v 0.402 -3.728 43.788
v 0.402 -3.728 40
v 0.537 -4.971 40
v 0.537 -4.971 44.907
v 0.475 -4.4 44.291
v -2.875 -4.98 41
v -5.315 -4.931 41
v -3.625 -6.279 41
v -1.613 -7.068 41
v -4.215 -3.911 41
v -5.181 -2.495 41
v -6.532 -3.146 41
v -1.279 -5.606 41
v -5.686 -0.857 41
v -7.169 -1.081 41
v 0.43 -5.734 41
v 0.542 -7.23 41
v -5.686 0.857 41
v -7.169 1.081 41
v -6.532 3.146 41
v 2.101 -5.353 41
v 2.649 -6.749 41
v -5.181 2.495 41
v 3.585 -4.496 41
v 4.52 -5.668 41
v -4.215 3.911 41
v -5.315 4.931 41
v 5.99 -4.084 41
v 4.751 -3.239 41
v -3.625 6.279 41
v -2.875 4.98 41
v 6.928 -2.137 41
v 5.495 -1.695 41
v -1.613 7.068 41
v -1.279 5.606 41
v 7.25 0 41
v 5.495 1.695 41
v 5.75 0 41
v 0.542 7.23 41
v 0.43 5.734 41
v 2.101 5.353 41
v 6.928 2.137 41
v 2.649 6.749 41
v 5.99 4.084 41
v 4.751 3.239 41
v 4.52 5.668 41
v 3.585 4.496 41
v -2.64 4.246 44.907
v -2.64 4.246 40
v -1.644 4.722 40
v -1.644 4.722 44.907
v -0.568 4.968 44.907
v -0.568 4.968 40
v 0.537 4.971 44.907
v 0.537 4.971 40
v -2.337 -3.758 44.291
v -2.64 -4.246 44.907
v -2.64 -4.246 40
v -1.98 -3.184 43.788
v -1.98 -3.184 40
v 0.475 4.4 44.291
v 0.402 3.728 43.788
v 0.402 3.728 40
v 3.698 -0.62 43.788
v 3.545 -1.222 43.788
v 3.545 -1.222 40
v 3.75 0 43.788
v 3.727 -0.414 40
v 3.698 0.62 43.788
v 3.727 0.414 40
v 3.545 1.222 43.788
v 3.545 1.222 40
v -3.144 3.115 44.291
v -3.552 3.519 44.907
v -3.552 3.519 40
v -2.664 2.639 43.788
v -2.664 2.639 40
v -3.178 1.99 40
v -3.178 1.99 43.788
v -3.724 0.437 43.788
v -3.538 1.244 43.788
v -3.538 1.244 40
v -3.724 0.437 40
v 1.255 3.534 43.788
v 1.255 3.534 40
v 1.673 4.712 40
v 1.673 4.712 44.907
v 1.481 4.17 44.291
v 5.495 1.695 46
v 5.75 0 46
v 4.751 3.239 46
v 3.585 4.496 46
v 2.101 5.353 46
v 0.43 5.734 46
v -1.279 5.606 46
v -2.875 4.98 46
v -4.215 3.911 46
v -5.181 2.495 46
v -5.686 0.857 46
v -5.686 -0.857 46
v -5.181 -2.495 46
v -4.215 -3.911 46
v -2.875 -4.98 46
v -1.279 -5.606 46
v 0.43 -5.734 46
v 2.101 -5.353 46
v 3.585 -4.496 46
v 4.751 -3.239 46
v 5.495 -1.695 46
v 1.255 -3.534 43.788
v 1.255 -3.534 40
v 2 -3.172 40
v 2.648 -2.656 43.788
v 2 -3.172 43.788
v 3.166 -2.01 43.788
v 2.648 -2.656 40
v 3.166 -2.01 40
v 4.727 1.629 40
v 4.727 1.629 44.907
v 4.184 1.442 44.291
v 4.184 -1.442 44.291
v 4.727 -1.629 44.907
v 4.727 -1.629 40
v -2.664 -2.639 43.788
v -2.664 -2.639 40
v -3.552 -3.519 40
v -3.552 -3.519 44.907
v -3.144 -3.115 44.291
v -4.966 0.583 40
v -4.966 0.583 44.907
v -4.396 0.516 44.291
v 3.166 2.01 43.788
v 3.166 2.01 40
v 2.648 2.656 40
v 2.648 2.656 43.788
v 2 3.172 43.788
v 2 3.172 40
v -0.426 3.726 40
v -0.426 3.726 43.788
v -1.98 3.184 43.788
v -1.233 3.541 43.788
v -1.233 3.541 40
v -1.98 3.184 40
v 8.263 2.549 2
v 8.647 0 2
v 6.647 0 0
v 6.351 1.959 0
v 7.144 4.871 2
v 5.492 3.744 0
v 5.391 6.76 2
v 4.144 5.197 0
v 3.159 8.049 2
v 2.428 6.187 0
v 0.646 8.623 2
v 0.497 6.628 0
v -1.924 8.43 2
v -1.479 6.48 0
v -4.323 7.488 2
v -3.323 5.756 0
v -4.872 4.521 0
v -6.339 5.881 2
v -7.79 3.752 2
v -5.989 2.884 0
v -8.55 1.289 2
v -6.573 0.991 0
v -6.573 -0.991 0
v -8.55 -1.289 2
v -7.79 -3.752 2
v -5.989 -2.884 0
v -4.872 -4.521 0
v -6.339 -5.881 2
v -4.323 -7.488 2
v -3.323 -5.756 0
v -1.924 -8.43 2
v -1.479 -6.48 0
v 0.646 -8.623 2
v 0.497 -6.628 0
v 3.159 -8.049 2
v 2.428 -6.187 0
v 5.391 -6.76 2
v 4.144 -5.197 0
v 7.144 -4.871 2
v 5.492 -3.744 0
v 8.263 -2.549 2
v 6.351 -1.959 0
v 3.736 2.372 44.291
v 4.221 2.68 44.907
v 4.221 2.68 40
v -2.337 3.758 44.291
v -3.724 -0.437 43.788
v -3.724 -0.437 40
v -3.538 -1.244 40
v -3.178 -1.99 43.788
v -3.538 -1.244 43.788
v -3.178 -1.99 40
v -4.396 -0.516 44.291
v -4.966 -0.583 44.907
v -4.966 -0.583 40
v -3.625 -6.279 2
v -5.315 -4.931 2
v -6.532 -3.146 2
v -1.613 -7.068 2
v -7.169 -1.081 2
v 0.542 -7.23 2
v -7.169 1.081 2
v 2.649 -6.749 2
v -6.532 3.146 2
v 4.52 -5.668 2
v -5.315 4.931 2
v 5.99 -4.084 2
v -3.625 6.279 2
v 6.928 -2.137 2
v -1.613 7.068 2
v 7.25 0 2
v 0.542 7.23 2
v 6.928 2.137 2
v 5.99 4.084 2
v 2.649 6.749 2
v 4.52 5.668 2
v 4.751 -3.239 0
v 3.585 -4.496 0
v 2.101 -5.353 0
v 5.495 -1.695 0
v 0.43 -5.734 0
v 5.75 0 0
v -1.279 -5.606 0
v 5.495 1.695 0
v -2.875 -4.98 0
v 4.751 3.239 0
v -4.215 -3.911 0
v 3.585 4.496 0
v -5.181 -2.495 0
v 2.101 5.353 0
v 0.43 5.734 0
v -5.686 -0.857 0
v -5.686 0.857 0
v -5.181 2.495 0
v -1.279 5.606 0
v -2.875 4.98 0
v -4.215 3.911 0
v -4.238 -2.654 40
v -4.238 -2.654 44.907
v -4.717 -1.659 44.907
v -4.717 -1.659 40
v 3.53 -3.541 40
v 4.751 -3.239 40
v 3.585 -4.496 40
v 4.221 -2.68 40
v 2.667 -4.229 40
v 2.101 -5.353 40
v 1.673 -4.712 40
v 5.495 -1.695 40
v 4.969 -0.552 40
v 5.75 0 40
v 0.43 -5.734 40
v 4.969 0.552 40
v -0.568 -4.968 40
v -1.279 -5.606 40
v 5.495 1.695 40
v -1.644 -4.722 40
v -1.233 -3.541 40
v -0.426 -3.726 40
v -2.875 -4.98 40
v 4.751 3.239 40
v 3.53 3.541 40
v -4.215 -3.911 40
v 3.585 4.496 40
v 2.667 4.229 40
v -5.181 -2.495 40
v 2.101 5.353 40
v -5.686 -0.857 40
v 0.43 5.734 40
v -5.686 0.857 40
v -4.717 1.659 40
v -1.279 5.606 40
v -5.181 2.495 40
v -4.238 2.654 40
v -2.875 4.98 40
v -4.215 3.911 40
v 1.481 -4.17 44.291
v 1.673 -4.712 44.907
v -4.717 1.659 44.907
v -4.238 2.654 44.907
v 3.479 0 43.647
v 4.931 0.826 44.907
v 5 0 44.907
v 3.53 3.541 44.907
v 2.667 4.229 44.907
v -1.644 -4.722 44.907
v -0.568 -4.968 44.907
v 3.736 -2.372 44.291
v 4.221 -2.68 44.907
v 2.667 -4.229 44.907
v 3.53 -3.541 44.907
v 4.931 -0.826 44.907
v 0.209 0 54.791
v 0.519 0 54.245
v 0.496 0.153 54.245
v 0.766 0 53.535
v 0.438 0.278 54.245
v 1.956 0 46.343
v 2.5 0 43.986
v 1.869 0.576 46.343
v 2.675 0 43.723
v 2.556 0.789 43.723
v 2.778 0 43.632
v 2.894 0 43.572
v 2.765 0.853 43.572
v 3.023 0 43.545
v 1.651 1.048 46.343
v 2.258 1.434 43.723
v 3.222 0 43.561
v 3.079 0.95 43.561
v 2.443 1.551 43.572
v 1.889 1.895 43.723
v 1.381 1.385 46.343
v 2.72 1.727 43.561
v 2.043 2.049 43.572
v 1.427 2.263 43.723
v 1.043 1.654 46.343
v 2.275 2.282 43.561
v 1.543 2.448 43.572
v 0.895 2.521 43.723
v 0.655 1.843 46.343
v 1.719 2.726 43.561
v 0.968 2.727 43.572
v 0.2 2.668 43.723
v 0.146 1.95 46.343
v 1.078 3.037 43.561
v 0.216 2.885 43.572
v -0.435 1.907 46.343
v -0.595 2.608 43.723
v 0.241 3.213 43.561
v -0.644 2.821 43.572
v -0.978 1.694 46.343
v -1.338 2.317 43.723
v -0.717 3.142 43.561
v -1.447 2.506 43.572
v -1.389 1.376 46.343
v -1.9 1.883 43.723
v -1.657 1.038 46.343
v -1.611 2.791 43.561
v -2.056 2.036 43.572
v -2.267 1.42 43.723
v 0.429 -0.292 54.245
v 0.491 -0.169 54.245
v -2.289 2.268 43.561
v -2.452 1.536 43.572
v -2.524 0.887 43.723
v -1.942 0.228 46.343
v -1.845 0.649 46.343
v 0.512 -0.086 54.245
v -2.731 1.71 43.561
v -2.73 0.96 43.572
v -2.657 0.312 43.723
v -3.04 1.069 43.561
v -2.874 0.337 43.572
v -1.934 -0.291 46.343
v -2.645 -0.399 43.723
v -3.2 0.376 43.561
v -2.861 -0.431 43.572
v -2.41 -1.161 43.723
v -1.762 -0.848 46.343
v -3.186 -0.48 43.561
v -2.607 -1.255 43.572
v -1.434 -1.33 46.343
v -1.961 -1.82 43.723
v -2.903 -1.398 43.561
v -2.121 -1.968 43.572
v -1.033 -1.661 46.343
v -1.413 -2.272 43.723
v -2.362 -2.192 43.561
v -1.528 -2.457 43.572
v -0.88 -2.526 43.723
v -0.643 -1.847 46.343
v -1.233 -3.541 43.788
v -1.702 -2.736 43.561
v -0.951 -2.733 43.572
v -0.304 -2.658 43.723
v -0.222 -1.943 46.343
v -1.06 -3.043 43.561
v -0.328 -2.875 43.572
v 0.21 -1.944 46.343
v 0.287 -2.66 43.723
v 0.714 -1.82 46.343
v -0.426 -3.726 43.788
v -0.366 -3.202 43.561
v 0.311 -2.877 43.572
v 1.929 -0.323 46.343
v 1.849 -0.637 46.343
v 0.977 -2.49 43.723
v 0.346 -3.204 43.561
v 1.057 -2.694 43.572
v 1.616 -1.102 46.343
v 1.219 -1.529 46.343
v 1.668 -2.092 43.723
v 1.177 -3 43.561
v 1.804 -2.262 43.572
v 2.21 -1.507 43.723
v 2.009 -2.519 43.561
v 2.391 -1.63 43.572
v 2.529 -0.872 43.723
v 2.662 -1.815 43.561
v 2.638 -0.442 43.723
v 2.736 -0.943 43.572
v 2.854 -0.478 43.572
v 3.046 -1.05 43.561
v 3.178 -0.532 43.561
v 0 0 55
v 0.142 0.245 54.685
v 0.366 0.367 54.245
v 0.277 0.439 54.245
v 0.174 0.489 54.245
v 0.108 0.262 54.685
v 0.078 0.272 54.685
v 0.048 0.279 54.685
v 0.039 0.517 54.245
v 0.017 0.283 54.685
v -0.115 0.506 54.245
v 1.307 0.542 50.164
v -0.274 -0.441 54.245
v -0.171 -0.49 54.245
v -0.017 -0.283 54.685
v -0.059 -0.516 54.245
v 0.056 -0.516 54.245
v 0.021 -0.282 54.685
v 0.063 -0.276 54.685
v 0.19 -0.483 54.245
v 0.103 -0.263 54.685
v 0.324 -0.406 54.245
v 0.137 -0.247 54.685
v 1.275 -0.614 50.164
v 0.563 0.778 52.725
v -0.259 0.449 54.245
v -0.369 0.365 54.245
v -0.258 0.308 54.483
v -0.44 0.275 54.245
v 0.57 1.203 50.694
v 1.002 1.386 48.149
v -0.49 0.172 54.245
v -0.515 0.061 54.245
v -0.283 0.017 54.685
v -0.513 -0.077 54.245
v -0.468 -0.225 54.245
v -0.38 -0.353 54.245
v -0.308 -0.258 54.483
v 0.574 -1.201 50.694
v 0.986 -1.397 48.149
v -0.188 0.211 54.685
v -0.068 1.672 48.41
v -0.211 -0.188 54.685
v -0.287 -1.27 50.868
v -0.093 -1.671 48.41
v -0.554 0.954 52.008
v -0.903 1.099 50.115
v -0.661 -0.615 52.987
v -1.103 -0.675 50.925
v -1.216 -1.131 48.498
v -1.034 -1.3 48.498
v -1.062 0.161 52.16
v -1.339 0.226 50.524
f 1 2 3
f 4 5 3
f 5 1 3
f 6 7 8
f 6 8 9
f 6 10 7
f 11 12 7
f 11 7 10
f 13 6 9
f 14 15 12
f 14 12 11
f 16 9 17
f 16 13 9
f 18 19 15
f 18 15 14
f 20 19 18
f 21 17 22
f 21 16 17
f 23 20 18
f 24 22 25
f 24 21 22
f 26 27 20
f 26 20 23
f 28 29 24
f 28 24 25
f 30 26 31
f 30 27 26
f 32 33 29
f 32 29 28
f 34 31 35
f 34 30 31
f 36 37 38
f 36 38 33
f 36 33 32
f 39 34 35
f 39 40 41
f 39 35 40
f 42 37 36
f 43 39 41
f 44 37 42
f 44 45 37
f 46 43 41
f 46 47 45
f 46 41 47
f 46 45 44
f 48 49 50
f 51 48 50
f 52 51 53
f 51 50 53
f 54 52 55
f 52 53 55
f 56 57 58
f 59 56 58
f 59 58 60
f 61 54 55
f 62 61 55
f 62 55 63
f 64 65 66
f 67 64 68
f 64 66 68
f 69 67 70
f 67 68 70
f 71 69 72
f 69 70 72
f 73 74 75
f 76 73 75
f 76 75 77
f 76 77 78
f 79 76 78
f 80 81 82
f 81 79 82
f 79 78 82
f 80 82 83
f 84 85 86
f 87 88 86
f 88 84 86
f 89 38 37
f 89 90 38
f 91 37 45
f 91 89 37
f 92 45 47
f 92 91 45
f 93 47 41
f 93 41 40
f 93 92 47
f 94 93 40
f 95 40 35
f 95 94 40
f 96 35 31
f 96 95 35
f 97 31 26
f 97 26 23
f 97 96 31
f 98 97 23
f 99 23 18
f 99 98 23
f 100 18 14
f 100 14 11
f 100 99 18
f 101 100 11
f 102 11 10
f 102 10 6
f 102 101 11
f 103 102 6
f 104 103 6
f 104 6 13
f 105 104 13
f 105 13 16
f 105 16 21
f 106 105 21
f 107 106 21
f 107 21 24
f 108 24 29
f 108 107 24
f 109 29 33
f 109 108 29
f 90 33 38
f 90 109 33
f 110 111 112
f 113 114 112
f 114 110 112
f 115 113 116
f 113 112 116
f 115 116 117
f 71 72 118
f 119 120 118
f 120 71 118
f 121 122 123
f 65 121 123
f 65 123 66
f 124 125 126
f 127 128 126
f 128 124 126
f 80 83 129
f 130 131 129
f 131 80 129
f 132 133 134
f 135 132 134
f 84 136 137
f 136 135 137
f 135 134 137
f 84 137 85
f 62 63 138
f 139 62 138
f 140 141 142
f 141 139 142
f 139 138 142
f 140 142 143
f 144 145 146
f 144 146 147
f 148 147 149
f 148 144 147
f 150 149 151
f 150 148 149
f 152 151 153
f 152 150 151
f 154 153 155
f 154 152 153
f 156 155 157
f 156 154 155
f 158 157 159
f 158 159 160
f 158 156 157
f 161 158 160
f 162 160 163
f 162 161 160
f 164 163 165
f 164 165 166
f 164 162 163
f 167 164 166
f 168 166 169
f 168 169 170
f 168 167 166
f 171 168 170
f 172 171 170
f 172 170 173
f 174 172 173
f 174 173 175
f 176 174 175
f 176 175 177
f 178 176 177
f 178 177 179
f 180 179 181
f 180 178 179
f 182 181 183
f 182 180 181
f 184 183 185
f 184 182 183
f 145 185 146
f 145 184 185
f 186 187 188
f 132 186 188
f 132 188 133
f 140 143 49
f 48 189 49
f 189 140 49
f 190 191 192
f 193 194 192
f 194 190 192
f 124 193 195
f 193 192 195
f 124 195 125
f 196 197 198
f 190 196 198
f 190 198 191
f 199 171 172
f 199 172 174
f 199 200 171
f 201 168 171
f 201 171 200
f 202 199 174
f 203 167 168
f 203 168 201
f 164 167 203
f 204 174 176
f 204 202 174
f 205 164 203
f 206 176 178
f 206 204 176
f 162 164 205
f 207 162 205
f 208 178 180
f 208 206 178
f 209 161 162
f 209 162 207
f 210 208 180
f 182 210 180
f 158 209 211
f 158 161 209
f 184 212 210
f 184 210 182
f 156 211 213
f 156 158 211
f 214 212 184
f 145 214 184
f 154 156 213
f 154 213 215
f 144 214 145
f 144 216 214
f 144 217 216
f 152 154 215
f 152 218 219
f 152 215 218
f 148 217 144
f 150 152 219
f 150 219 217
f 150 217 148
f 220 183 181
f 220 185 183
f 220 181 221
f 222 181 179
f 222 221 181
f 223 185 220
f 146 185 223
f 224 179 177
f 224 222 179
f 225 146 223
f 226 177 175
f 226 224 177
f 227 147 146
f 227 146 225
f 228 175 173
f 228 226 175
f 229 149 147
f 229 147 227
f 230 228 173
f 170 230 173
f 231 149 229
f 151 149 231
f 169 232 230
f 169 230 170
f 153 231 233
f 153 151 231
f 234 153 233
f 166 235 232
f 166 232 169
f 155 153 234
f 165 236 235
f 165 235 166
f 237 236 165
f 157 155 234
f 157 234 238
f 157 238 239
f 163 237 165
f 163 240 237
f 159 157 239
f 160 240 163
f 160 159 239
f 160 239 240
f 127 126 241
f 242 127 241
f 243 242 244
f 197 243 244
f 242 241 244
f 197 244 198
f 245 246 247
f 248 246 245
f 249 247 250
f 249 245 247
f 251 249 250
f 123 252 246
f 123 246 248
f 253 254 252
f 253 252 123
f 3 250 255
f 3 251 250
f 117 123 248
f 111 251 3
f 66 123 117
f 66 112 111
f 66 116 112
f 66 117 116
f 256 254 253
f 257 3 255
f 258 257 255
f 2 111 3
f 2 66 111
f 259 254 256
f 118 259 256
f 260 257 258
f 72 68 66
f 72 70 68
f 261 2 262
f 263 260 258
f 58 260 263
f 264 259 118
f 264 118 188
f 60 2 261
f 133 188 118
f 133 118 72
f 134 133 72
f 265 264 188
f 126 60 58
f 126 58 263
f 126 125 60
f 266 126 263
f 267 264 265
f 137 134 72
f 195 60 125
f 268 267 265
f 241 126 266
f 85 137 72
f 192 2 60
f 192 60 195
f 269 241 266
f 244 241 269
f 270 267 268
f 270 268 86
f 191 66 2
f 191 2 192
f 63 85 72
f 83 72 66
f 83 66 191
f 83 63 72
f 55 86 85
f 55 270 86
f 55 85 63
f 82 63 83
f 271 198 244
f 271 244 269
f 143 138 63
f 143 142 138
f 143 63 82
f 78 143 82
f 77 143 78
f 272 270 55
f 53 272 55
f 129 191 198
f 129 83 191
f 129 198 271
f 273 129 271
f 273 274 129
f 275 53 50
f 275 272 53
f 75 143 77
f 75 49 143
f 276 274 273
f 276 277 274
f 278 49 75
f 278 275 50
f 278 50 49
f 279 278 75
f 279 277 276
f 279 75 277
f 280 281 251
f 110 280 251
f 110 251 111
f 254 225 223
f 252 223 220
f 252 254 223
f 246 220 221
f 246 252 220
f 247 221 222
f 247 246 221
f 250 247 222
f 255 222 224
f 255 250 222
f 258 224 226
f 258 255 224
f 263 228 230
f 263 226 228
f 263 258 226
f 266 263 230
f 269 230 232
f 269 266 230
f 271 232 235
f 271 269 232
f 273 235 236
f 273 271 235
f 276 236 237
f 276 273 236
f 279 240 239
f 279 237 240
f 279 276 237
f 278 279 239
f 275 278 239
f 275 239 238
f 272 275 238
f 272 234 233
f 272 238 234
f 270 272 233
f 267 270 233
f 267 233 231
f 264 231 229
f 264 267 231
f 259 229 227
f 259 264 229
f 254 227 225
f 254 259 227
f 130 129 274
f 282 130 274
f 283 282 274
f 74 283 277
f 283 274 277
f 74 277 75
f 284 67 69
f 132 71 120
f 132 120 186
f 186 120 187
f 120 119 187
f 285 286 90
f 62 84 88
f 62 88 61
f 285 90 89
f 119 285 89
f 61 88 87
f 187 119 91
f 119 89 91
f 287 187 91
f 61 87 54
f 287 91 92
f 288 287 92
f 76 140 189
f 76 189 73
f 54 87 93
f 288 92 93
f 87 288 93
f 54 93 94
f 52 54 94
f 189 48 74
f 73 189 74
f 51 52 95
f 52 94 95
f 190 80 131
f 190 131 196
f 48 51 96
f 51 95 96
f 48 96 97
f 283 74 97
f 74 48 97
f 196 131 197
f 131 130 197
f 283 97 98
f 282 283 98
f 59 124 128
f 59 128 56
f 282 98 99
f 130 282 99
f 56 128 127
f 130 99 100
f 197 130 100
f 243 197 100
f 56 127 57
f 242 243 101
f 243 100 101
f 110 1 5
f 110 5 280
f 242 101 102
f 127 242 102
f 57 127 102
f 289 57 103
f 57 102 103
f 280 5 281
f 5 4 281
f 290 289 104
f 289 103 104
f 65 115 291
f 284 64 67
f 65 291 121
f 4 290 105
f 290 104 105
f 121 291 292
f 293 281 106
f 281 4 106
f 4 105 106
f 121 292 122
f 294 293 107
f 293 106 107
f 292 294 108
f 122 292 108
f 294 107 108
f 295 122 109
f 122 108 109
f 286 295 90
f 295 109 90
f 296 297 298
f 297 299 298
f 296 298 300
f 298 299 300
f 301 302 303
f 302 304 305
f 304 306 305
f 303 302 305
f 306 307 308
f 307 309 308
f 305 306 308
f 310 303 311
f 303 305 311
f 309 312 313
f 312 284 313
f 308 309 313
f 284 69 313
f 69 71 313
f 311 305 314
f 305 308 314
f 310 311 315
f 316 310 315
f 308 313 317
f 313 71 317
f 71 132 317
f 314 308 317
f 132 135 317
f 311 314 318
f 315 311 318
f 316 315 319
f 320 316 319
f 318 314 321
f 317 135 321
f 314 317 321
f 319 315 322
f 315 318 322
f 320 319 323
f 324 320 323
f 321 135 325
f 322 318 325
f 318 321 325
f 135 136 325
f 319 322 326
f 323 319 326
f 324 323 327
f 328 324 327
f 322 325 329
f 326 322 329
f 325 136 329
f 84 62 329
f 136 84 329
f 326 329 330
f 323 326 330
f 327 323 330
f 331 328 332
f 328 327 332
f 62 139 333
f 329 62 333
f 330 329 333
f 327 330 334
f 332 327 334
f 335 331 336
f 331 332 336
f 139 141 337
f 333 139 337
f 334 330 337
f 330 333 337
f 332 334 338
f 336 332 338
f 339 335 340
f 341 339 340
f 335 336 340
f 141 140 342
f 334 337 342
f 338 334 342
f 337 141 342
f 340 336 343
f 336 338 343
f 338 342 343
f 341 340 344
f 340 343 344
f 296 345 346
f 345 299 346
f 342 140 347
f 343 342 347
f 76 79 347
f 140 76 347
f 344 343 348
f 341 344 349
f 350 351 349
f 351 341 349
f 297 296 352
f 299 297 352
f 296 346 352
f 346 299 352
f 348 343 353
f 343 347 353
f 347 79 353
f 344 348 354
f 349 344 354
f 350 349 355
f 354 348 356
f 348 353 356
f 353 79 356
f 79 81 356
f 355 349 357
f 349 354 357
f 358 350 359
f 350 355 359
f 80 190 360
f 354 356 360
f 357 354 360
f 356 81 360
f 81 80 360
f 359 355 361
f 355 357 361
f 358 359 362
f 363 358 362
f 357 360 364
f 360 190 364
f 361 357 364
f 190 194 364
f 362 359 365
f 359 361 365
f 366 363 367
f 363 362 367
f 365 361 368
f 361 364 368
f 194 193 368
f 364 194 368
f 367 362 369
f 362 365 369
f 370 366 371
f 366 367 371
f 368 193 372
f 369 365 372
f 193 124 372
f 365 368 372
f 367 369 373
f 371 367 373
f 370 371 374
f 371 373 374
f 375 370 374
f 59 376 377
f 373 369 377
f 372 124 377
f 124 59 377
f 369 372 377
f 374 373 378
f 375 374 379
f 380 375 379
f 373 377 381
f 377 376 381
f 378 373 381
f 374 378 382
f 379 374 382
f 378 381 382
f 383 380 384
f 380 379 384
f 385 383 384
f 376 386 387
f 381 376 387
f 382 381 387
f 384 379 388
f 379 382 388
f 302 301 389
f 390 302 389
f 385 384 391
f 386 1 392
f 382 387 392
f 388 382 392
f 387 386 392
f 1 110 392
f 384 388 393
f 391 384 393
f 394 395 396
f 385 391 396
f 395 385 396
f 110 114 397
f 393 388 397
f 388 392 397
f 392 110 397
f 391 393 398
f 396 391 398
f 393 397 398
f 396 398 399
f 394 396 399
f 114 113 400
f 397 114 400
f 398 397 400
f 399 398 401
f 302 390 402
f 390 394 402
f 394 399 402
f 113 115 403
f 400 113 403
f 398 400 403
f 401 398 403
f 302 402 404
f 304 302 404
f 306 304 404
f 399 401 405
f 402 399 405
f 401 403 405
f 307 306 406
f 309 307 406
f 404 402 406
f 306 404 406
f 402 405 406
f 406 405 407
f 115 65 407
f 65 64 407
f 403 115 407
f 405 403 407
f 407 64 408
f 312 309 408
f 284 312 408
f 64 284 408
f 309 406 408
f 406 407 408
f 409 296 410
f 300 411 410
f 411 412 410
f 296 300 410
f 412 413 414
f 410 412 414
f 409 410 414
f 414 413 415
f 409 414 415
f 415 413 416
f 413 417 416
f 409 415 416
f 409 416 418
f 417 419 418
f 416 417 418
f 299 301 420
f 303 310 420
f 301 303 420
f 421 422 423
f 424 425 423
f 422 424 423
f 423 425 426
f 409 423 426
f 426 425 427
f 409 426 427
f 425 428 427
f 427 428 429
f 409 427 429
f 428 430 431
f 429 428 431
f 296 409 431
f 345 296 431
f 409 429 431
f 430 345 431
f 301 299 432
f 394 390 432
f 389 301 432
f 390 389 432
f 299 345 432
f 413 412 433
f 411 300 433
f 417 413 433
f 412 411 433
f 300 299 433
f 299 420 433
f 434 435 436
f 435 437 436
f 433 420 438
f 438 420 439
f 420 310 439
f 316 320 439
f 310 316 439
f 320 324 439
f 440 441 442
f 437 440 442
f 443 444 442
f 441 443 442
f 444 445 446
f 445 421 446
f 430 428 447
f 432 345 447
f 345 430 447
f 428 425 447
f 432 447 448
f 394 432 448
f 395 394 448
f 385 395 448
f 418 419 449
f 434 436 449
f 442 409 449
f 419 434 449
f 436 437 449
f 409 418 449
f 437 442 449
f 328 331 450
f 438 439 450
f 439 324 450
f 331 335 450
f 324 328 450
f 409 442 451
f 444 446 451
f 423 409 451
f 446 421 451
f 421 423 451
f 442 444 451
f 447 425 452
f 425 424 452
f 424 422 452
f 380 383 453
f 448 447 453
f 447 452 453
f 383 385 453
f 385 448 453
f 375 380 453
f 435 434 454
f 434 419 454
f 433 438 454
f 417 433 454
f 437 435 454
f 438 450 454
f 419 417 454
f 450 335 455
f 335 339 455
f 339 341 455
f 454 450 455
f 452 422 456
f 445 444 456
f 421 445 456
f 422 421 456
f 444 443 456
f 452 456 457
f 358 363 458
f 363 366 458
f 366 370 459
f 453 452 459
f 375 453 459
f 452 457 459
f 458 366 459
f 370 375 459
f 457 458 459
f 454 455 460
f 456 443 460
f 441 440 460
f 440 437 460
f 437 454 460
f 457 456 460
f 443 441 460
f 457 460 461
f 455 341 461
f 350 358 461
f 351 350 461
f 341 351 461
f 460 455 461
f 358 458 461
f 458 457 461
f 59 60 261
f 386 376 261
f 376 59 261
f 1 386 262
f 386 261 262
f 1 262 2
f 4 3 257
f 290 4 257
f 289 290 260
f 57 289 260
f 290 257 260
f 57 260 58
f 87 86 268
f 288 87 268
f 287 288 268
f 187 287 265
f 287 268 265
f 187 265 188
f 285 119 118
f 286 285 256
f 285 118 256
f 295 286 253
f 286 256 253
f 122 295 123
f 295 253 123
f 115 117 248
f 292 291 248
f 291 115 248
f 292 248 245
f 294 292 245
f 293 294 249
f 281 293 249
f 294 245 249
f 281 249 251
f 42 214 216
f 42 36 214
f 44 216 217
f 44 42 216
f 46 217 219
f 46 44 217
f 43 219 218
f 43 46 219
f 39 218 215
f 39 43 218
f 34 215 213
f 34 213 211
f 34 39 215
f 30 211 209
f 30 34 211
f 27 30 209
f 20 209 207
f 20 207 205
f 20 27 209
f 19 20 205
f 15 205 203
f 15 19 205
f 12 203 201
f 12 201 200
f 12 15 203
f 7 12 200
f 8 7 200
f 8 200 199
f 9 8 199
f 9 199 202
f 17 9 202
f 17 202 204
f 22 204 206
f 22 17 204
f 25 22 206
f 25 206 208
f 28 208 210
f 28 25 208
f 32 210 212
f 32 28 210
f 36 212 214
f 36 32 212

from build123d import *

# Parameters (mm, degrees)
F2_SIZE2  = 1.99999
F2_SIZE   = 1.99999
F5_R      = 5.75
F6_DEPTH  = 25
F7_R      = 5.75
F8_DEPTH  = 25
F10_DEPTH = 25


# Not quite as in the source:
# - a fillet or chamfer is up to 0.001 mm smaller than in the source, because OpenCascade refuses the exact size


with BuildPart() as f1:
    # F0 (on Front) → F1 (revolve)
    with BuildSketch(Plane.XZ):
        with BuildLine():
            Line((8.64674, 2), (7.25, 2))
            Line((7.25, 2), (7.25, 41))
            Line((7.25, 41), (5.75, 41))
            Line((5.75, 41), (5.75, 40))
            Line((5.75, 40), (4.75, 40))
            Line((4.75, 40), (4.75, 39))
            ThreePointArc((4.75, 39), (5.4571067812, 38.7071067812), (5.75, 38))
            Line((5.75, 38), (5.75, 4.9999998882))
            ThreePointArc((5.75, 4.9999998882), (5.4571067812, 4.2928931071), (4.75, 3.9999998882))
            Line((4.75, 3.9999998882), (4.75, 2.9999998882))
            Line((4.75, 2.9999998882), (5.75, 2.9999998882))
            Line((5.75, 2.9999998882), (5.75, 0))
            Line((5.75, 0), (8.64674, 0))
            Line((8.64674, 0), (8.64674, 2))
        make_face()
    revolve(axis=Axis((0, 0, 27.7979653329), (0, 0, 1)))

    # F2 (size 2 and 2 in the source; OpenCascade refuses exactly that, so slightly less here)
    f2_edges = [f1.edges().sort_by_distance(p)[0] for p in [
        (-8.64674, 0, 0),
    ]]
    chamfer(f2_edges, length=F2_SIZE, length2=F2_SIZE2)

    # F3 (on Front) → F4 (revolve)
    with BuildSketch(Plane.XZ):
        with BuildLine():
            Line((0, 55), (0, 41))
            Line((0, 41), (0, 40))
            Line((0, 40), (5.75, 40))
            Line((5.75, 40), (5.75, 46))
            add(Edge.make_bspline(
                [(0, 55), (0.1440579667, 54.8954034218), (0.4017096448, 54.5348723025), (0.9570213075, 53.3087861702), (1.7966593586, 47.7287211885), (2.1990543329, 44.2884011591), (2.9678127556, 43.2712194265), (4.3524509198, 44.1285353141), (5.1923480343, 45.0871969322), (5.5351351682, 45.7667505271), (5.75, 46)],
                knots=[0, 0, 0, 0, 0.0706016145, 0.1776436842, 0.4082606642, 0.5899939047, 0.6786962714, 0.7910306665, 0.9027344001, 1, 1, 1, 1], degree=3))
        make_face()
    revolve(axis=Axis((0, 0, 2), (0, 0, 1)))

    # F5 (on face) → F6 (cut)
    with BuildSketch(Plane(origin=(0, 0, 40), x_dir=(1, 0, 0), z_dir=(0, 0, -1))):
        Circle(F5_R)
    extrude(amount=F6_DEPTH, mode=Mode.SUBTRACT)

    # F7 (on face) → F8 (cut)
    with BuildSketch(Plane(origin=(0, 0, 2.9999998882), x_dir=(1, 0, 0), z_dir=(0, 0, -1))):
        Circle(F7_R)
    extrude(amount=-F8_DEPTH, mode=Mode.SUBTRACT)

    # F9 (on face) → F10 (cut)
    with BuildSketch(Plane(origin=(0, 0, 40), x_dir=(1, 0, 0), z_dir=(0, 0, -1))):
        with BuildLine():
            ThreePointArc((3.5453054724, 1.222010273), (3.75, 0), (3.5453054724, -1.222010273))
            Line((3.5453054724, -1.222010273), (4.7270739632, -1.6293470307))
            ThreePointArc((4.7270739632, -1.6293470307), (5, 0), (4.7270739632, 1.6293470307))
            Line((4.7270739632, 1.6293470307), (3.5453054724, 1.222010273))
        make_face()
        with BuildLine():
            Line((3.1658679099, 2.0099204903), (4.2211572131, 2.6798939871))
            ThreePointArc((4.2211572131, 2.6798939871), (3.1174490093, 3.9091574123), (1.6734076042, 4.7116565017))
            Line((1.6734076042, 4.7116565017), (1.2550557032, 3.5337423763))
            ThreePointArc((1.2550557032, 3.5337423763), (2.338086757, 2.9318680593), (3.1658679099, 2.0099204903))
        make_face()
        with BuildLine():
            Line((0.4024672392, 3.7283401295), (0.5366229857, 4.9711201727))
            ThreePointArc((0.5366229857, 4.9711201727), (-1.1126046698, 4.8746395609), (-2.640368812, 4.2459925267))
            Line((-2.640368812, 4.2459925267), (-1.980276609, 3.184494395))
            ThreePointArc((-1.980276609, 3.184494395), (-0.8344535023, 3.6559796707), (0.4024672392, 3.7283401295))
        make_face()
        with BuildLine():
            Line((-2.6639994714, 2.6392436069), (-3.5519992951, 3.5189914759))
            ThreePointArc((-3.5519992951, 3.5189914759), (-4.5048443395, 2.1694186956), (-4.9658936591, 0.5830095766))
            Line((-4.9658936591, 0.5830095766), (-3.7244202443, 0.4372571824))
            ThreePointArc((-3.7244202443, 0.4372571824), (-3.3786332546, 1.6270640217), (-2.6639994714, 2.6392436069))
        make_face()
        with BuildLine():
            Line((-3.7244202443, -0.4372571824), (-4.9658936591, -0.5830095766))
            ThreePointArc((-4.9658936591, -0.5830095766), (-4.5048443395, -2.1694186956), (-3.5519992951, -3.5189914759))
            Line((-3.5519992951, -3.5189914759), (-2.6639994714, -2.6392436069))
            ThreePointArc((-2.6639994714, -2.6392436069), (-3.3786332546, -1.6270640217), (-3.7244202443, -0.4372571824))
        make_face()
        with BuildLine():
            Line((-1.980276609, -3.184494395), (-2.640368812, -4.2459925267))
            ThreePointArc((-2.640368812, -4.2459925267), (-1.1126046698, -4.8746395609), (0.5366229857, -4.9711201727))
            Line((0.5366229857, -4.9711201727), (0.4024672392, -3.7283401295))
            ThreePointArc((0.4024672392, -3.7283401295), (-0.8344535023, -3.6559796707), (-1.980276609, -3.184494395))
        make_face()
        with BuildLine():
            Line((1.2550557032, -3.5337423763), (1.6734076042, -4.7116565017))
            ThreePointArc((1.6734076042, -4.7116565017), (3.1174490093, -3.9091574123), (4.2211572131, -2.6798939871))
            Line((4.2211572131, -2.6798939871), (3.1658679099, -2.0099204903))
            ThreePointArc((3.1658679099, -2.0099204903), (2.338086757, -2.9318680593), (1.2550557032, -3.5337423763))
        make_face()
    extrude(amount=-F10_DEPTH, mode=Mode.SUBTRACT)


solid = f1.part
